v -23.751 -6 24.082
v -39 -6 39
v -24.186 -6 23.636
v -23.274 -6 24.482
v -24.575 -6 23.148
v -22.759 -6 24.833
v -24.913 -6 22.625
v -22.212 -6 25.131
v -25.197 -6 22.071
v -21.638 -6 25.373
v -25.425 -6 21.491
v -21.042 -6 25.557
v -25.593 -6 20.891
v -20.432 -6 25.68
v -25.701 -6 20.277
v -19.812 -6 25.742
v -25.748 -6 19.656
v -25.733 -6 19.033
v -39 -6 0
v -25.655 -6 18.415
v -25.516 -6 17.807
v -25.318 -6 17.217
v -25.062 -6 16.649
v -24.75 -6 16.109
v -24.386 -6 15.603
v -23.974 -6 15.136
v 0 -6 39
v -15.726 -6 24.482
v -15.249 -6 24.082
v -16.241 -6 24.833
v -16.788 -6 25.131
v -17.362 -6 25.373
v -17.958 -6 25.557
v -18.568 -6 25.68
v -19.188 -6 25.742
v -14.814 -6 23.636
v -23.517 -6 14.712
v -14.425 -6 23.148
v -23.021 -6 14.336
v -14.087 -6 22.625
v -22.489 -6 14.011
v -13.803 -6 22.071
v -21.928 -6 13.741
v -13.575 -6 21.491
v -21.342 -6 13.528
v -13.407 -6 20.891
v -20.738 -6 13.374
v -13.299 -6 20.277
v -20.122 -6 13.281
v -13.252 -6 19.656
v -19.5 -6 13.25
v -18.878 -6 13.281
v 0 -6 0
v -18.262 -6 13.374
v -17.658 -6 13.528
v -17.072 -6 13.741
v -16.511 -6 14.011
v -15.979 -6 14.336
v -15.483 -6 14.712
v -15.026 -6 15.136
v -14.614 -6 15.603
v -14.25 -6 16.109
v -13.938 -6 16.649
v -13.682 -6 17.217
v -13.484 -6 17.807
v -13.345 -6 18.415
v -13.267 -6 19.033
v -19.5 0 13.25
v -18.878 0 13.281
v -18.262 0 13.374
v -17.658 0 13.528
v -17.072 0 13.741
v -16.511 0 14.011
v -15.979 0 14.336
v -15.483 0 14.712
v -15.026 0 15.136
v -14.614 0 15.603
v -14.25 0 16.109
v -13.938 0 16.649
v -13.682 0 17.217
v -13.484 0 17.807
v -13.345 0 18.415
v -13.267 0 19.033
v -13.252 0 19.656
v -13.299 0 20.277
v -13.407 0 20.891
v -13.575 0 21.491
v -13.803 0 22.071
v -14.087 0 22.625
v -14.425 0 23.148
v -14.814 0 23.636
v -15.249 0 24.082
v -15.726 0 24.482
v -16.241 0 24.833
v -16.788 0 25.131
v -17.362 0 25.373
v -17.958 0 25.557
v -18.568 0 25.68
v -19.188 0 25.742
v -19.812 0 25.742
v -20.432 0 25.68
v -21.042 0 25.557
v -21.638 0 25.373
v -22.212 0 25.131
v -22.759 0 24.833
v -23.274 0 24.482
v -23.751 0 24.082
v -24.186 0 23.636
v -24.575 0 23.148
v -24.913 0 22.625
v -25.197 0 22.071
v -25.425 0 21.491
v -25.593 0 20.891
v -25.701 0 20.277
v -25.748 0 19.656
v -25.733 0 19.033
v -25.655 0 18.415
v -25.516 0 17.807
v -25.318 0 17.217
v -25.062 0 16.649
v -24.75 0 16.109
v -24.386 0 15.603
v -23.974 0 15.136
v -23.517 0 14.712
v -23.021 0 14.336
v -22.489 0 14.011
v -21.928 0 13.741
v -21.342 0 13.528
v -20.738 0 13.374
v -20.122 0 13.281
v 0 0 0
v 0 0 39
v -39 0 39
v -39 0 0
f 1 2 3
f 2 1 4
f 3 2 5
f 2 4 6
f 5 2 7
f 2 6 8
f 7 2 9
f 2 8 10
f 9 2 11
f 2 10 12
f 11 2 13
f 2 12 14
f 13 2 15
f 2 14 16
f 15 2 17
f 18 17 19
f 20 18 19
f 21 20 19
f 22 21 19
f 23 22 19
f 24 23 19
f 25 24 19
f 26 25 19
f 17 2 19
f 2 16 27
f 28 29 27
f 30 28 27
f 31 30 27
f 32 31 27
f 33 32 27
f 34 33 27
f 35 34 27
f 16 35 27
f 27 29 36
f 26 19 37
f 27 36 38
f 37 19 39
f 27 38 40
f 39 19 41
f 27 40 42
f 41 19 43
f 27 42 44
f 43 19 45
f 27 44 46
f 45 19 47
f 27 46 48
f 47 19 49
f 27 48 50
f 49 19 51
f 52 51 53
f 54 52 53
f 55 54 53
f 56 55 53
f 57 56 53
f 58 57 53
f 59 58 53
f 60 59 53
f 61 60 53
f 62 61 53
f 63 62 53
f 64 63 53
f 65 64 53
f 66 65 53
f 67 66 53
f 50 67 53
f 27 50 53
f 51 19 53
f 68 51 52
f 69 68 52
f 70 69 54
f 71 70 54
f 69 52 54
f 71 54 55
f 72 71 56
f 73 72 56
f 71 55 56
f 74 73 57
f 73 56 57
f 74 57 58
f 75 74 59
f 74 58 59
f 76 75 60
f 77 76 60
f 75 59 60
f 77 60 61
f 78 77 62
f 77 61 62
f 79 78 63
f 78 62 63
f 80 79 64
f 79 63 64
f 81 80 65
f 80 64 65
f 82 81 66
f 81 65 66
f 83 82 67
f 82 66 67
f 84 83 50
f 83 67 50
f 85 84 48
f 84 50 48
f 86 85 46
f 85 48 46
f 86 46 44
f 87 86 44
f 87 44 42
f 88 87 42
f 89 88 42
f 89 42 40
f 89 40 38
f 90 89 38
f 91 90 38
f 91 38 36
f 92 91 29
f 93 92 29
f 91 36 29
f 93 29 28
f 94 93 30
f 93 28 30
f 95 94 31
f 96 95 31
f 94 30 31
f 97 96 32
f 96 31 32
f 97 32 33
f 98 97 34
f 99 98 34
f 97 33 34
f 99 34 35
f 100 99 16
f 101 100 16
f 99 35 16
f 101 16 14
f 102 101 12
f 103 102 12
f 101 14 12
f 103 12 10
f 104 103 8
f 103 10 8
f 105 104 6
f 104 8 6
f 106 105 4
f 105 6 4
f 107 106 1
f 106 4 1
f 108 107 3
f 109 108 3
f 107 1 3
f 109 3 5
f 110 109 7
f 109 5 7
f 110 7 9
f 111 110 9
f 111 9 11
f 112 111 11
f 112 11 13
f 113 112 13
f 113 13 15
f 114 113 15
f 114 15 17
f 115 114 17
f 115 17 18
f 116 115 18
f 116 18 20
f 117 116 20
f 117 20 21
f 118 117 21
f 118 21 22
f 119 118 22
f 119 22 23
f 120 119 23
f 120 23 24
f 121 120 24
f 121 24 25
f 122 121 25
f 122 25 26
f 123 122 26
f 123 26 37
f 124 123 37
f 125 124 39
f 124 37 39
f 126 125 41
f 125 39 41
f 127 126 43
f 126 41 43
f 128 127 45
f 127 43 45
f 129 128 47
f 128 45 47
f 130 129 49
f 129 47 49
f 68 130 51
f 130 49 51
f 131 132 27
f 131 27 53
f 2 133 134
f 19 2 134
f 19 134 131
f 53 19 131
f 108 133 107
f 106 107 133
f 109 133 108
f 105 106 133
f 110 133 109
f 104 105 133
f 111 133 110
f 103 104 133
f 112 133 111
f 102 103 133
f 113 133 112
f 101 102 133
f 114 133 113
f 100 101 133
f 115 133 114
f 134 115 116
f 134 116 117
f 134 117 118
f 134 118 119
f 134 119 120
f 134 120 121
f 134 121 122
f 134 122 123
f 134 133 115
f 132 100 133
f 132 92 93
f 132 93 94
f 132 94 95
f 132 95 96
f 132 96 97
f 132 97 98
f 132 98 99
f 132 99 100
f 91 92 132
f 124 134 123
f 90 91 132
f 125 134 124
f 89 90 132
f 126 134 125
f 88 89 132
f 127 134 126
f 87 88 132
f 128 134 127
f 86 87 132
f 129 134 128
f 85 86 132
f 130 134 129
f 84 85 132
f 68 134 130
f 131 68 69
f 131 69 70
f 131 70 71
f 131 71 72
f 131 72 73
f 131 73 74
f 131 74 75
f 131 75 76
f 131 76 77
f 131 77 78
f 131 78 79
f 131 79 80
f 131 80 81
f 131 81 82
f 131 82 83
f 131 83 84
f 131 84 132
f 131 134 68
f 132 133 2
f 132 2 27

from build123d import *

# Parameters (mm, degrees)
SKETCH2_W           = 39
SKETCH2_H           = 39
BOSS_EXTRUDE2_DEPTH = 6
SKETCH4_R           = 6.25
CUT_EXTRUDE2_DEPTH  = 6


with BuildPart() as part:
    # Sketch2 → Boss-Extrude2 (new body)
    with BuildSketch(Plane(origin=(0, 0, 0), x_dir=(1, 0, 0), z_dir=(0, 1, 0))):
        with Locations((-19.5, -19.5)):
            Rectangle(SKETCH2_W, SKETCH2_H)
    extrude(amount=-BOSS_EXTRUDE2_DEPTH)

    # Sketch4 → Cut-Extrude2 (cut)
    with BuildSketch(Plane.XZ.offset(6)):
        with Locations(Location((-19.5, 19.5, 0), (0, 0, 270))):
            Circle(SKETCH4_R)
    extrude(amount=-CUT_EXTRUDE2_DEPTH, mode=Mode.SUBTRACT)


solid = part.part
